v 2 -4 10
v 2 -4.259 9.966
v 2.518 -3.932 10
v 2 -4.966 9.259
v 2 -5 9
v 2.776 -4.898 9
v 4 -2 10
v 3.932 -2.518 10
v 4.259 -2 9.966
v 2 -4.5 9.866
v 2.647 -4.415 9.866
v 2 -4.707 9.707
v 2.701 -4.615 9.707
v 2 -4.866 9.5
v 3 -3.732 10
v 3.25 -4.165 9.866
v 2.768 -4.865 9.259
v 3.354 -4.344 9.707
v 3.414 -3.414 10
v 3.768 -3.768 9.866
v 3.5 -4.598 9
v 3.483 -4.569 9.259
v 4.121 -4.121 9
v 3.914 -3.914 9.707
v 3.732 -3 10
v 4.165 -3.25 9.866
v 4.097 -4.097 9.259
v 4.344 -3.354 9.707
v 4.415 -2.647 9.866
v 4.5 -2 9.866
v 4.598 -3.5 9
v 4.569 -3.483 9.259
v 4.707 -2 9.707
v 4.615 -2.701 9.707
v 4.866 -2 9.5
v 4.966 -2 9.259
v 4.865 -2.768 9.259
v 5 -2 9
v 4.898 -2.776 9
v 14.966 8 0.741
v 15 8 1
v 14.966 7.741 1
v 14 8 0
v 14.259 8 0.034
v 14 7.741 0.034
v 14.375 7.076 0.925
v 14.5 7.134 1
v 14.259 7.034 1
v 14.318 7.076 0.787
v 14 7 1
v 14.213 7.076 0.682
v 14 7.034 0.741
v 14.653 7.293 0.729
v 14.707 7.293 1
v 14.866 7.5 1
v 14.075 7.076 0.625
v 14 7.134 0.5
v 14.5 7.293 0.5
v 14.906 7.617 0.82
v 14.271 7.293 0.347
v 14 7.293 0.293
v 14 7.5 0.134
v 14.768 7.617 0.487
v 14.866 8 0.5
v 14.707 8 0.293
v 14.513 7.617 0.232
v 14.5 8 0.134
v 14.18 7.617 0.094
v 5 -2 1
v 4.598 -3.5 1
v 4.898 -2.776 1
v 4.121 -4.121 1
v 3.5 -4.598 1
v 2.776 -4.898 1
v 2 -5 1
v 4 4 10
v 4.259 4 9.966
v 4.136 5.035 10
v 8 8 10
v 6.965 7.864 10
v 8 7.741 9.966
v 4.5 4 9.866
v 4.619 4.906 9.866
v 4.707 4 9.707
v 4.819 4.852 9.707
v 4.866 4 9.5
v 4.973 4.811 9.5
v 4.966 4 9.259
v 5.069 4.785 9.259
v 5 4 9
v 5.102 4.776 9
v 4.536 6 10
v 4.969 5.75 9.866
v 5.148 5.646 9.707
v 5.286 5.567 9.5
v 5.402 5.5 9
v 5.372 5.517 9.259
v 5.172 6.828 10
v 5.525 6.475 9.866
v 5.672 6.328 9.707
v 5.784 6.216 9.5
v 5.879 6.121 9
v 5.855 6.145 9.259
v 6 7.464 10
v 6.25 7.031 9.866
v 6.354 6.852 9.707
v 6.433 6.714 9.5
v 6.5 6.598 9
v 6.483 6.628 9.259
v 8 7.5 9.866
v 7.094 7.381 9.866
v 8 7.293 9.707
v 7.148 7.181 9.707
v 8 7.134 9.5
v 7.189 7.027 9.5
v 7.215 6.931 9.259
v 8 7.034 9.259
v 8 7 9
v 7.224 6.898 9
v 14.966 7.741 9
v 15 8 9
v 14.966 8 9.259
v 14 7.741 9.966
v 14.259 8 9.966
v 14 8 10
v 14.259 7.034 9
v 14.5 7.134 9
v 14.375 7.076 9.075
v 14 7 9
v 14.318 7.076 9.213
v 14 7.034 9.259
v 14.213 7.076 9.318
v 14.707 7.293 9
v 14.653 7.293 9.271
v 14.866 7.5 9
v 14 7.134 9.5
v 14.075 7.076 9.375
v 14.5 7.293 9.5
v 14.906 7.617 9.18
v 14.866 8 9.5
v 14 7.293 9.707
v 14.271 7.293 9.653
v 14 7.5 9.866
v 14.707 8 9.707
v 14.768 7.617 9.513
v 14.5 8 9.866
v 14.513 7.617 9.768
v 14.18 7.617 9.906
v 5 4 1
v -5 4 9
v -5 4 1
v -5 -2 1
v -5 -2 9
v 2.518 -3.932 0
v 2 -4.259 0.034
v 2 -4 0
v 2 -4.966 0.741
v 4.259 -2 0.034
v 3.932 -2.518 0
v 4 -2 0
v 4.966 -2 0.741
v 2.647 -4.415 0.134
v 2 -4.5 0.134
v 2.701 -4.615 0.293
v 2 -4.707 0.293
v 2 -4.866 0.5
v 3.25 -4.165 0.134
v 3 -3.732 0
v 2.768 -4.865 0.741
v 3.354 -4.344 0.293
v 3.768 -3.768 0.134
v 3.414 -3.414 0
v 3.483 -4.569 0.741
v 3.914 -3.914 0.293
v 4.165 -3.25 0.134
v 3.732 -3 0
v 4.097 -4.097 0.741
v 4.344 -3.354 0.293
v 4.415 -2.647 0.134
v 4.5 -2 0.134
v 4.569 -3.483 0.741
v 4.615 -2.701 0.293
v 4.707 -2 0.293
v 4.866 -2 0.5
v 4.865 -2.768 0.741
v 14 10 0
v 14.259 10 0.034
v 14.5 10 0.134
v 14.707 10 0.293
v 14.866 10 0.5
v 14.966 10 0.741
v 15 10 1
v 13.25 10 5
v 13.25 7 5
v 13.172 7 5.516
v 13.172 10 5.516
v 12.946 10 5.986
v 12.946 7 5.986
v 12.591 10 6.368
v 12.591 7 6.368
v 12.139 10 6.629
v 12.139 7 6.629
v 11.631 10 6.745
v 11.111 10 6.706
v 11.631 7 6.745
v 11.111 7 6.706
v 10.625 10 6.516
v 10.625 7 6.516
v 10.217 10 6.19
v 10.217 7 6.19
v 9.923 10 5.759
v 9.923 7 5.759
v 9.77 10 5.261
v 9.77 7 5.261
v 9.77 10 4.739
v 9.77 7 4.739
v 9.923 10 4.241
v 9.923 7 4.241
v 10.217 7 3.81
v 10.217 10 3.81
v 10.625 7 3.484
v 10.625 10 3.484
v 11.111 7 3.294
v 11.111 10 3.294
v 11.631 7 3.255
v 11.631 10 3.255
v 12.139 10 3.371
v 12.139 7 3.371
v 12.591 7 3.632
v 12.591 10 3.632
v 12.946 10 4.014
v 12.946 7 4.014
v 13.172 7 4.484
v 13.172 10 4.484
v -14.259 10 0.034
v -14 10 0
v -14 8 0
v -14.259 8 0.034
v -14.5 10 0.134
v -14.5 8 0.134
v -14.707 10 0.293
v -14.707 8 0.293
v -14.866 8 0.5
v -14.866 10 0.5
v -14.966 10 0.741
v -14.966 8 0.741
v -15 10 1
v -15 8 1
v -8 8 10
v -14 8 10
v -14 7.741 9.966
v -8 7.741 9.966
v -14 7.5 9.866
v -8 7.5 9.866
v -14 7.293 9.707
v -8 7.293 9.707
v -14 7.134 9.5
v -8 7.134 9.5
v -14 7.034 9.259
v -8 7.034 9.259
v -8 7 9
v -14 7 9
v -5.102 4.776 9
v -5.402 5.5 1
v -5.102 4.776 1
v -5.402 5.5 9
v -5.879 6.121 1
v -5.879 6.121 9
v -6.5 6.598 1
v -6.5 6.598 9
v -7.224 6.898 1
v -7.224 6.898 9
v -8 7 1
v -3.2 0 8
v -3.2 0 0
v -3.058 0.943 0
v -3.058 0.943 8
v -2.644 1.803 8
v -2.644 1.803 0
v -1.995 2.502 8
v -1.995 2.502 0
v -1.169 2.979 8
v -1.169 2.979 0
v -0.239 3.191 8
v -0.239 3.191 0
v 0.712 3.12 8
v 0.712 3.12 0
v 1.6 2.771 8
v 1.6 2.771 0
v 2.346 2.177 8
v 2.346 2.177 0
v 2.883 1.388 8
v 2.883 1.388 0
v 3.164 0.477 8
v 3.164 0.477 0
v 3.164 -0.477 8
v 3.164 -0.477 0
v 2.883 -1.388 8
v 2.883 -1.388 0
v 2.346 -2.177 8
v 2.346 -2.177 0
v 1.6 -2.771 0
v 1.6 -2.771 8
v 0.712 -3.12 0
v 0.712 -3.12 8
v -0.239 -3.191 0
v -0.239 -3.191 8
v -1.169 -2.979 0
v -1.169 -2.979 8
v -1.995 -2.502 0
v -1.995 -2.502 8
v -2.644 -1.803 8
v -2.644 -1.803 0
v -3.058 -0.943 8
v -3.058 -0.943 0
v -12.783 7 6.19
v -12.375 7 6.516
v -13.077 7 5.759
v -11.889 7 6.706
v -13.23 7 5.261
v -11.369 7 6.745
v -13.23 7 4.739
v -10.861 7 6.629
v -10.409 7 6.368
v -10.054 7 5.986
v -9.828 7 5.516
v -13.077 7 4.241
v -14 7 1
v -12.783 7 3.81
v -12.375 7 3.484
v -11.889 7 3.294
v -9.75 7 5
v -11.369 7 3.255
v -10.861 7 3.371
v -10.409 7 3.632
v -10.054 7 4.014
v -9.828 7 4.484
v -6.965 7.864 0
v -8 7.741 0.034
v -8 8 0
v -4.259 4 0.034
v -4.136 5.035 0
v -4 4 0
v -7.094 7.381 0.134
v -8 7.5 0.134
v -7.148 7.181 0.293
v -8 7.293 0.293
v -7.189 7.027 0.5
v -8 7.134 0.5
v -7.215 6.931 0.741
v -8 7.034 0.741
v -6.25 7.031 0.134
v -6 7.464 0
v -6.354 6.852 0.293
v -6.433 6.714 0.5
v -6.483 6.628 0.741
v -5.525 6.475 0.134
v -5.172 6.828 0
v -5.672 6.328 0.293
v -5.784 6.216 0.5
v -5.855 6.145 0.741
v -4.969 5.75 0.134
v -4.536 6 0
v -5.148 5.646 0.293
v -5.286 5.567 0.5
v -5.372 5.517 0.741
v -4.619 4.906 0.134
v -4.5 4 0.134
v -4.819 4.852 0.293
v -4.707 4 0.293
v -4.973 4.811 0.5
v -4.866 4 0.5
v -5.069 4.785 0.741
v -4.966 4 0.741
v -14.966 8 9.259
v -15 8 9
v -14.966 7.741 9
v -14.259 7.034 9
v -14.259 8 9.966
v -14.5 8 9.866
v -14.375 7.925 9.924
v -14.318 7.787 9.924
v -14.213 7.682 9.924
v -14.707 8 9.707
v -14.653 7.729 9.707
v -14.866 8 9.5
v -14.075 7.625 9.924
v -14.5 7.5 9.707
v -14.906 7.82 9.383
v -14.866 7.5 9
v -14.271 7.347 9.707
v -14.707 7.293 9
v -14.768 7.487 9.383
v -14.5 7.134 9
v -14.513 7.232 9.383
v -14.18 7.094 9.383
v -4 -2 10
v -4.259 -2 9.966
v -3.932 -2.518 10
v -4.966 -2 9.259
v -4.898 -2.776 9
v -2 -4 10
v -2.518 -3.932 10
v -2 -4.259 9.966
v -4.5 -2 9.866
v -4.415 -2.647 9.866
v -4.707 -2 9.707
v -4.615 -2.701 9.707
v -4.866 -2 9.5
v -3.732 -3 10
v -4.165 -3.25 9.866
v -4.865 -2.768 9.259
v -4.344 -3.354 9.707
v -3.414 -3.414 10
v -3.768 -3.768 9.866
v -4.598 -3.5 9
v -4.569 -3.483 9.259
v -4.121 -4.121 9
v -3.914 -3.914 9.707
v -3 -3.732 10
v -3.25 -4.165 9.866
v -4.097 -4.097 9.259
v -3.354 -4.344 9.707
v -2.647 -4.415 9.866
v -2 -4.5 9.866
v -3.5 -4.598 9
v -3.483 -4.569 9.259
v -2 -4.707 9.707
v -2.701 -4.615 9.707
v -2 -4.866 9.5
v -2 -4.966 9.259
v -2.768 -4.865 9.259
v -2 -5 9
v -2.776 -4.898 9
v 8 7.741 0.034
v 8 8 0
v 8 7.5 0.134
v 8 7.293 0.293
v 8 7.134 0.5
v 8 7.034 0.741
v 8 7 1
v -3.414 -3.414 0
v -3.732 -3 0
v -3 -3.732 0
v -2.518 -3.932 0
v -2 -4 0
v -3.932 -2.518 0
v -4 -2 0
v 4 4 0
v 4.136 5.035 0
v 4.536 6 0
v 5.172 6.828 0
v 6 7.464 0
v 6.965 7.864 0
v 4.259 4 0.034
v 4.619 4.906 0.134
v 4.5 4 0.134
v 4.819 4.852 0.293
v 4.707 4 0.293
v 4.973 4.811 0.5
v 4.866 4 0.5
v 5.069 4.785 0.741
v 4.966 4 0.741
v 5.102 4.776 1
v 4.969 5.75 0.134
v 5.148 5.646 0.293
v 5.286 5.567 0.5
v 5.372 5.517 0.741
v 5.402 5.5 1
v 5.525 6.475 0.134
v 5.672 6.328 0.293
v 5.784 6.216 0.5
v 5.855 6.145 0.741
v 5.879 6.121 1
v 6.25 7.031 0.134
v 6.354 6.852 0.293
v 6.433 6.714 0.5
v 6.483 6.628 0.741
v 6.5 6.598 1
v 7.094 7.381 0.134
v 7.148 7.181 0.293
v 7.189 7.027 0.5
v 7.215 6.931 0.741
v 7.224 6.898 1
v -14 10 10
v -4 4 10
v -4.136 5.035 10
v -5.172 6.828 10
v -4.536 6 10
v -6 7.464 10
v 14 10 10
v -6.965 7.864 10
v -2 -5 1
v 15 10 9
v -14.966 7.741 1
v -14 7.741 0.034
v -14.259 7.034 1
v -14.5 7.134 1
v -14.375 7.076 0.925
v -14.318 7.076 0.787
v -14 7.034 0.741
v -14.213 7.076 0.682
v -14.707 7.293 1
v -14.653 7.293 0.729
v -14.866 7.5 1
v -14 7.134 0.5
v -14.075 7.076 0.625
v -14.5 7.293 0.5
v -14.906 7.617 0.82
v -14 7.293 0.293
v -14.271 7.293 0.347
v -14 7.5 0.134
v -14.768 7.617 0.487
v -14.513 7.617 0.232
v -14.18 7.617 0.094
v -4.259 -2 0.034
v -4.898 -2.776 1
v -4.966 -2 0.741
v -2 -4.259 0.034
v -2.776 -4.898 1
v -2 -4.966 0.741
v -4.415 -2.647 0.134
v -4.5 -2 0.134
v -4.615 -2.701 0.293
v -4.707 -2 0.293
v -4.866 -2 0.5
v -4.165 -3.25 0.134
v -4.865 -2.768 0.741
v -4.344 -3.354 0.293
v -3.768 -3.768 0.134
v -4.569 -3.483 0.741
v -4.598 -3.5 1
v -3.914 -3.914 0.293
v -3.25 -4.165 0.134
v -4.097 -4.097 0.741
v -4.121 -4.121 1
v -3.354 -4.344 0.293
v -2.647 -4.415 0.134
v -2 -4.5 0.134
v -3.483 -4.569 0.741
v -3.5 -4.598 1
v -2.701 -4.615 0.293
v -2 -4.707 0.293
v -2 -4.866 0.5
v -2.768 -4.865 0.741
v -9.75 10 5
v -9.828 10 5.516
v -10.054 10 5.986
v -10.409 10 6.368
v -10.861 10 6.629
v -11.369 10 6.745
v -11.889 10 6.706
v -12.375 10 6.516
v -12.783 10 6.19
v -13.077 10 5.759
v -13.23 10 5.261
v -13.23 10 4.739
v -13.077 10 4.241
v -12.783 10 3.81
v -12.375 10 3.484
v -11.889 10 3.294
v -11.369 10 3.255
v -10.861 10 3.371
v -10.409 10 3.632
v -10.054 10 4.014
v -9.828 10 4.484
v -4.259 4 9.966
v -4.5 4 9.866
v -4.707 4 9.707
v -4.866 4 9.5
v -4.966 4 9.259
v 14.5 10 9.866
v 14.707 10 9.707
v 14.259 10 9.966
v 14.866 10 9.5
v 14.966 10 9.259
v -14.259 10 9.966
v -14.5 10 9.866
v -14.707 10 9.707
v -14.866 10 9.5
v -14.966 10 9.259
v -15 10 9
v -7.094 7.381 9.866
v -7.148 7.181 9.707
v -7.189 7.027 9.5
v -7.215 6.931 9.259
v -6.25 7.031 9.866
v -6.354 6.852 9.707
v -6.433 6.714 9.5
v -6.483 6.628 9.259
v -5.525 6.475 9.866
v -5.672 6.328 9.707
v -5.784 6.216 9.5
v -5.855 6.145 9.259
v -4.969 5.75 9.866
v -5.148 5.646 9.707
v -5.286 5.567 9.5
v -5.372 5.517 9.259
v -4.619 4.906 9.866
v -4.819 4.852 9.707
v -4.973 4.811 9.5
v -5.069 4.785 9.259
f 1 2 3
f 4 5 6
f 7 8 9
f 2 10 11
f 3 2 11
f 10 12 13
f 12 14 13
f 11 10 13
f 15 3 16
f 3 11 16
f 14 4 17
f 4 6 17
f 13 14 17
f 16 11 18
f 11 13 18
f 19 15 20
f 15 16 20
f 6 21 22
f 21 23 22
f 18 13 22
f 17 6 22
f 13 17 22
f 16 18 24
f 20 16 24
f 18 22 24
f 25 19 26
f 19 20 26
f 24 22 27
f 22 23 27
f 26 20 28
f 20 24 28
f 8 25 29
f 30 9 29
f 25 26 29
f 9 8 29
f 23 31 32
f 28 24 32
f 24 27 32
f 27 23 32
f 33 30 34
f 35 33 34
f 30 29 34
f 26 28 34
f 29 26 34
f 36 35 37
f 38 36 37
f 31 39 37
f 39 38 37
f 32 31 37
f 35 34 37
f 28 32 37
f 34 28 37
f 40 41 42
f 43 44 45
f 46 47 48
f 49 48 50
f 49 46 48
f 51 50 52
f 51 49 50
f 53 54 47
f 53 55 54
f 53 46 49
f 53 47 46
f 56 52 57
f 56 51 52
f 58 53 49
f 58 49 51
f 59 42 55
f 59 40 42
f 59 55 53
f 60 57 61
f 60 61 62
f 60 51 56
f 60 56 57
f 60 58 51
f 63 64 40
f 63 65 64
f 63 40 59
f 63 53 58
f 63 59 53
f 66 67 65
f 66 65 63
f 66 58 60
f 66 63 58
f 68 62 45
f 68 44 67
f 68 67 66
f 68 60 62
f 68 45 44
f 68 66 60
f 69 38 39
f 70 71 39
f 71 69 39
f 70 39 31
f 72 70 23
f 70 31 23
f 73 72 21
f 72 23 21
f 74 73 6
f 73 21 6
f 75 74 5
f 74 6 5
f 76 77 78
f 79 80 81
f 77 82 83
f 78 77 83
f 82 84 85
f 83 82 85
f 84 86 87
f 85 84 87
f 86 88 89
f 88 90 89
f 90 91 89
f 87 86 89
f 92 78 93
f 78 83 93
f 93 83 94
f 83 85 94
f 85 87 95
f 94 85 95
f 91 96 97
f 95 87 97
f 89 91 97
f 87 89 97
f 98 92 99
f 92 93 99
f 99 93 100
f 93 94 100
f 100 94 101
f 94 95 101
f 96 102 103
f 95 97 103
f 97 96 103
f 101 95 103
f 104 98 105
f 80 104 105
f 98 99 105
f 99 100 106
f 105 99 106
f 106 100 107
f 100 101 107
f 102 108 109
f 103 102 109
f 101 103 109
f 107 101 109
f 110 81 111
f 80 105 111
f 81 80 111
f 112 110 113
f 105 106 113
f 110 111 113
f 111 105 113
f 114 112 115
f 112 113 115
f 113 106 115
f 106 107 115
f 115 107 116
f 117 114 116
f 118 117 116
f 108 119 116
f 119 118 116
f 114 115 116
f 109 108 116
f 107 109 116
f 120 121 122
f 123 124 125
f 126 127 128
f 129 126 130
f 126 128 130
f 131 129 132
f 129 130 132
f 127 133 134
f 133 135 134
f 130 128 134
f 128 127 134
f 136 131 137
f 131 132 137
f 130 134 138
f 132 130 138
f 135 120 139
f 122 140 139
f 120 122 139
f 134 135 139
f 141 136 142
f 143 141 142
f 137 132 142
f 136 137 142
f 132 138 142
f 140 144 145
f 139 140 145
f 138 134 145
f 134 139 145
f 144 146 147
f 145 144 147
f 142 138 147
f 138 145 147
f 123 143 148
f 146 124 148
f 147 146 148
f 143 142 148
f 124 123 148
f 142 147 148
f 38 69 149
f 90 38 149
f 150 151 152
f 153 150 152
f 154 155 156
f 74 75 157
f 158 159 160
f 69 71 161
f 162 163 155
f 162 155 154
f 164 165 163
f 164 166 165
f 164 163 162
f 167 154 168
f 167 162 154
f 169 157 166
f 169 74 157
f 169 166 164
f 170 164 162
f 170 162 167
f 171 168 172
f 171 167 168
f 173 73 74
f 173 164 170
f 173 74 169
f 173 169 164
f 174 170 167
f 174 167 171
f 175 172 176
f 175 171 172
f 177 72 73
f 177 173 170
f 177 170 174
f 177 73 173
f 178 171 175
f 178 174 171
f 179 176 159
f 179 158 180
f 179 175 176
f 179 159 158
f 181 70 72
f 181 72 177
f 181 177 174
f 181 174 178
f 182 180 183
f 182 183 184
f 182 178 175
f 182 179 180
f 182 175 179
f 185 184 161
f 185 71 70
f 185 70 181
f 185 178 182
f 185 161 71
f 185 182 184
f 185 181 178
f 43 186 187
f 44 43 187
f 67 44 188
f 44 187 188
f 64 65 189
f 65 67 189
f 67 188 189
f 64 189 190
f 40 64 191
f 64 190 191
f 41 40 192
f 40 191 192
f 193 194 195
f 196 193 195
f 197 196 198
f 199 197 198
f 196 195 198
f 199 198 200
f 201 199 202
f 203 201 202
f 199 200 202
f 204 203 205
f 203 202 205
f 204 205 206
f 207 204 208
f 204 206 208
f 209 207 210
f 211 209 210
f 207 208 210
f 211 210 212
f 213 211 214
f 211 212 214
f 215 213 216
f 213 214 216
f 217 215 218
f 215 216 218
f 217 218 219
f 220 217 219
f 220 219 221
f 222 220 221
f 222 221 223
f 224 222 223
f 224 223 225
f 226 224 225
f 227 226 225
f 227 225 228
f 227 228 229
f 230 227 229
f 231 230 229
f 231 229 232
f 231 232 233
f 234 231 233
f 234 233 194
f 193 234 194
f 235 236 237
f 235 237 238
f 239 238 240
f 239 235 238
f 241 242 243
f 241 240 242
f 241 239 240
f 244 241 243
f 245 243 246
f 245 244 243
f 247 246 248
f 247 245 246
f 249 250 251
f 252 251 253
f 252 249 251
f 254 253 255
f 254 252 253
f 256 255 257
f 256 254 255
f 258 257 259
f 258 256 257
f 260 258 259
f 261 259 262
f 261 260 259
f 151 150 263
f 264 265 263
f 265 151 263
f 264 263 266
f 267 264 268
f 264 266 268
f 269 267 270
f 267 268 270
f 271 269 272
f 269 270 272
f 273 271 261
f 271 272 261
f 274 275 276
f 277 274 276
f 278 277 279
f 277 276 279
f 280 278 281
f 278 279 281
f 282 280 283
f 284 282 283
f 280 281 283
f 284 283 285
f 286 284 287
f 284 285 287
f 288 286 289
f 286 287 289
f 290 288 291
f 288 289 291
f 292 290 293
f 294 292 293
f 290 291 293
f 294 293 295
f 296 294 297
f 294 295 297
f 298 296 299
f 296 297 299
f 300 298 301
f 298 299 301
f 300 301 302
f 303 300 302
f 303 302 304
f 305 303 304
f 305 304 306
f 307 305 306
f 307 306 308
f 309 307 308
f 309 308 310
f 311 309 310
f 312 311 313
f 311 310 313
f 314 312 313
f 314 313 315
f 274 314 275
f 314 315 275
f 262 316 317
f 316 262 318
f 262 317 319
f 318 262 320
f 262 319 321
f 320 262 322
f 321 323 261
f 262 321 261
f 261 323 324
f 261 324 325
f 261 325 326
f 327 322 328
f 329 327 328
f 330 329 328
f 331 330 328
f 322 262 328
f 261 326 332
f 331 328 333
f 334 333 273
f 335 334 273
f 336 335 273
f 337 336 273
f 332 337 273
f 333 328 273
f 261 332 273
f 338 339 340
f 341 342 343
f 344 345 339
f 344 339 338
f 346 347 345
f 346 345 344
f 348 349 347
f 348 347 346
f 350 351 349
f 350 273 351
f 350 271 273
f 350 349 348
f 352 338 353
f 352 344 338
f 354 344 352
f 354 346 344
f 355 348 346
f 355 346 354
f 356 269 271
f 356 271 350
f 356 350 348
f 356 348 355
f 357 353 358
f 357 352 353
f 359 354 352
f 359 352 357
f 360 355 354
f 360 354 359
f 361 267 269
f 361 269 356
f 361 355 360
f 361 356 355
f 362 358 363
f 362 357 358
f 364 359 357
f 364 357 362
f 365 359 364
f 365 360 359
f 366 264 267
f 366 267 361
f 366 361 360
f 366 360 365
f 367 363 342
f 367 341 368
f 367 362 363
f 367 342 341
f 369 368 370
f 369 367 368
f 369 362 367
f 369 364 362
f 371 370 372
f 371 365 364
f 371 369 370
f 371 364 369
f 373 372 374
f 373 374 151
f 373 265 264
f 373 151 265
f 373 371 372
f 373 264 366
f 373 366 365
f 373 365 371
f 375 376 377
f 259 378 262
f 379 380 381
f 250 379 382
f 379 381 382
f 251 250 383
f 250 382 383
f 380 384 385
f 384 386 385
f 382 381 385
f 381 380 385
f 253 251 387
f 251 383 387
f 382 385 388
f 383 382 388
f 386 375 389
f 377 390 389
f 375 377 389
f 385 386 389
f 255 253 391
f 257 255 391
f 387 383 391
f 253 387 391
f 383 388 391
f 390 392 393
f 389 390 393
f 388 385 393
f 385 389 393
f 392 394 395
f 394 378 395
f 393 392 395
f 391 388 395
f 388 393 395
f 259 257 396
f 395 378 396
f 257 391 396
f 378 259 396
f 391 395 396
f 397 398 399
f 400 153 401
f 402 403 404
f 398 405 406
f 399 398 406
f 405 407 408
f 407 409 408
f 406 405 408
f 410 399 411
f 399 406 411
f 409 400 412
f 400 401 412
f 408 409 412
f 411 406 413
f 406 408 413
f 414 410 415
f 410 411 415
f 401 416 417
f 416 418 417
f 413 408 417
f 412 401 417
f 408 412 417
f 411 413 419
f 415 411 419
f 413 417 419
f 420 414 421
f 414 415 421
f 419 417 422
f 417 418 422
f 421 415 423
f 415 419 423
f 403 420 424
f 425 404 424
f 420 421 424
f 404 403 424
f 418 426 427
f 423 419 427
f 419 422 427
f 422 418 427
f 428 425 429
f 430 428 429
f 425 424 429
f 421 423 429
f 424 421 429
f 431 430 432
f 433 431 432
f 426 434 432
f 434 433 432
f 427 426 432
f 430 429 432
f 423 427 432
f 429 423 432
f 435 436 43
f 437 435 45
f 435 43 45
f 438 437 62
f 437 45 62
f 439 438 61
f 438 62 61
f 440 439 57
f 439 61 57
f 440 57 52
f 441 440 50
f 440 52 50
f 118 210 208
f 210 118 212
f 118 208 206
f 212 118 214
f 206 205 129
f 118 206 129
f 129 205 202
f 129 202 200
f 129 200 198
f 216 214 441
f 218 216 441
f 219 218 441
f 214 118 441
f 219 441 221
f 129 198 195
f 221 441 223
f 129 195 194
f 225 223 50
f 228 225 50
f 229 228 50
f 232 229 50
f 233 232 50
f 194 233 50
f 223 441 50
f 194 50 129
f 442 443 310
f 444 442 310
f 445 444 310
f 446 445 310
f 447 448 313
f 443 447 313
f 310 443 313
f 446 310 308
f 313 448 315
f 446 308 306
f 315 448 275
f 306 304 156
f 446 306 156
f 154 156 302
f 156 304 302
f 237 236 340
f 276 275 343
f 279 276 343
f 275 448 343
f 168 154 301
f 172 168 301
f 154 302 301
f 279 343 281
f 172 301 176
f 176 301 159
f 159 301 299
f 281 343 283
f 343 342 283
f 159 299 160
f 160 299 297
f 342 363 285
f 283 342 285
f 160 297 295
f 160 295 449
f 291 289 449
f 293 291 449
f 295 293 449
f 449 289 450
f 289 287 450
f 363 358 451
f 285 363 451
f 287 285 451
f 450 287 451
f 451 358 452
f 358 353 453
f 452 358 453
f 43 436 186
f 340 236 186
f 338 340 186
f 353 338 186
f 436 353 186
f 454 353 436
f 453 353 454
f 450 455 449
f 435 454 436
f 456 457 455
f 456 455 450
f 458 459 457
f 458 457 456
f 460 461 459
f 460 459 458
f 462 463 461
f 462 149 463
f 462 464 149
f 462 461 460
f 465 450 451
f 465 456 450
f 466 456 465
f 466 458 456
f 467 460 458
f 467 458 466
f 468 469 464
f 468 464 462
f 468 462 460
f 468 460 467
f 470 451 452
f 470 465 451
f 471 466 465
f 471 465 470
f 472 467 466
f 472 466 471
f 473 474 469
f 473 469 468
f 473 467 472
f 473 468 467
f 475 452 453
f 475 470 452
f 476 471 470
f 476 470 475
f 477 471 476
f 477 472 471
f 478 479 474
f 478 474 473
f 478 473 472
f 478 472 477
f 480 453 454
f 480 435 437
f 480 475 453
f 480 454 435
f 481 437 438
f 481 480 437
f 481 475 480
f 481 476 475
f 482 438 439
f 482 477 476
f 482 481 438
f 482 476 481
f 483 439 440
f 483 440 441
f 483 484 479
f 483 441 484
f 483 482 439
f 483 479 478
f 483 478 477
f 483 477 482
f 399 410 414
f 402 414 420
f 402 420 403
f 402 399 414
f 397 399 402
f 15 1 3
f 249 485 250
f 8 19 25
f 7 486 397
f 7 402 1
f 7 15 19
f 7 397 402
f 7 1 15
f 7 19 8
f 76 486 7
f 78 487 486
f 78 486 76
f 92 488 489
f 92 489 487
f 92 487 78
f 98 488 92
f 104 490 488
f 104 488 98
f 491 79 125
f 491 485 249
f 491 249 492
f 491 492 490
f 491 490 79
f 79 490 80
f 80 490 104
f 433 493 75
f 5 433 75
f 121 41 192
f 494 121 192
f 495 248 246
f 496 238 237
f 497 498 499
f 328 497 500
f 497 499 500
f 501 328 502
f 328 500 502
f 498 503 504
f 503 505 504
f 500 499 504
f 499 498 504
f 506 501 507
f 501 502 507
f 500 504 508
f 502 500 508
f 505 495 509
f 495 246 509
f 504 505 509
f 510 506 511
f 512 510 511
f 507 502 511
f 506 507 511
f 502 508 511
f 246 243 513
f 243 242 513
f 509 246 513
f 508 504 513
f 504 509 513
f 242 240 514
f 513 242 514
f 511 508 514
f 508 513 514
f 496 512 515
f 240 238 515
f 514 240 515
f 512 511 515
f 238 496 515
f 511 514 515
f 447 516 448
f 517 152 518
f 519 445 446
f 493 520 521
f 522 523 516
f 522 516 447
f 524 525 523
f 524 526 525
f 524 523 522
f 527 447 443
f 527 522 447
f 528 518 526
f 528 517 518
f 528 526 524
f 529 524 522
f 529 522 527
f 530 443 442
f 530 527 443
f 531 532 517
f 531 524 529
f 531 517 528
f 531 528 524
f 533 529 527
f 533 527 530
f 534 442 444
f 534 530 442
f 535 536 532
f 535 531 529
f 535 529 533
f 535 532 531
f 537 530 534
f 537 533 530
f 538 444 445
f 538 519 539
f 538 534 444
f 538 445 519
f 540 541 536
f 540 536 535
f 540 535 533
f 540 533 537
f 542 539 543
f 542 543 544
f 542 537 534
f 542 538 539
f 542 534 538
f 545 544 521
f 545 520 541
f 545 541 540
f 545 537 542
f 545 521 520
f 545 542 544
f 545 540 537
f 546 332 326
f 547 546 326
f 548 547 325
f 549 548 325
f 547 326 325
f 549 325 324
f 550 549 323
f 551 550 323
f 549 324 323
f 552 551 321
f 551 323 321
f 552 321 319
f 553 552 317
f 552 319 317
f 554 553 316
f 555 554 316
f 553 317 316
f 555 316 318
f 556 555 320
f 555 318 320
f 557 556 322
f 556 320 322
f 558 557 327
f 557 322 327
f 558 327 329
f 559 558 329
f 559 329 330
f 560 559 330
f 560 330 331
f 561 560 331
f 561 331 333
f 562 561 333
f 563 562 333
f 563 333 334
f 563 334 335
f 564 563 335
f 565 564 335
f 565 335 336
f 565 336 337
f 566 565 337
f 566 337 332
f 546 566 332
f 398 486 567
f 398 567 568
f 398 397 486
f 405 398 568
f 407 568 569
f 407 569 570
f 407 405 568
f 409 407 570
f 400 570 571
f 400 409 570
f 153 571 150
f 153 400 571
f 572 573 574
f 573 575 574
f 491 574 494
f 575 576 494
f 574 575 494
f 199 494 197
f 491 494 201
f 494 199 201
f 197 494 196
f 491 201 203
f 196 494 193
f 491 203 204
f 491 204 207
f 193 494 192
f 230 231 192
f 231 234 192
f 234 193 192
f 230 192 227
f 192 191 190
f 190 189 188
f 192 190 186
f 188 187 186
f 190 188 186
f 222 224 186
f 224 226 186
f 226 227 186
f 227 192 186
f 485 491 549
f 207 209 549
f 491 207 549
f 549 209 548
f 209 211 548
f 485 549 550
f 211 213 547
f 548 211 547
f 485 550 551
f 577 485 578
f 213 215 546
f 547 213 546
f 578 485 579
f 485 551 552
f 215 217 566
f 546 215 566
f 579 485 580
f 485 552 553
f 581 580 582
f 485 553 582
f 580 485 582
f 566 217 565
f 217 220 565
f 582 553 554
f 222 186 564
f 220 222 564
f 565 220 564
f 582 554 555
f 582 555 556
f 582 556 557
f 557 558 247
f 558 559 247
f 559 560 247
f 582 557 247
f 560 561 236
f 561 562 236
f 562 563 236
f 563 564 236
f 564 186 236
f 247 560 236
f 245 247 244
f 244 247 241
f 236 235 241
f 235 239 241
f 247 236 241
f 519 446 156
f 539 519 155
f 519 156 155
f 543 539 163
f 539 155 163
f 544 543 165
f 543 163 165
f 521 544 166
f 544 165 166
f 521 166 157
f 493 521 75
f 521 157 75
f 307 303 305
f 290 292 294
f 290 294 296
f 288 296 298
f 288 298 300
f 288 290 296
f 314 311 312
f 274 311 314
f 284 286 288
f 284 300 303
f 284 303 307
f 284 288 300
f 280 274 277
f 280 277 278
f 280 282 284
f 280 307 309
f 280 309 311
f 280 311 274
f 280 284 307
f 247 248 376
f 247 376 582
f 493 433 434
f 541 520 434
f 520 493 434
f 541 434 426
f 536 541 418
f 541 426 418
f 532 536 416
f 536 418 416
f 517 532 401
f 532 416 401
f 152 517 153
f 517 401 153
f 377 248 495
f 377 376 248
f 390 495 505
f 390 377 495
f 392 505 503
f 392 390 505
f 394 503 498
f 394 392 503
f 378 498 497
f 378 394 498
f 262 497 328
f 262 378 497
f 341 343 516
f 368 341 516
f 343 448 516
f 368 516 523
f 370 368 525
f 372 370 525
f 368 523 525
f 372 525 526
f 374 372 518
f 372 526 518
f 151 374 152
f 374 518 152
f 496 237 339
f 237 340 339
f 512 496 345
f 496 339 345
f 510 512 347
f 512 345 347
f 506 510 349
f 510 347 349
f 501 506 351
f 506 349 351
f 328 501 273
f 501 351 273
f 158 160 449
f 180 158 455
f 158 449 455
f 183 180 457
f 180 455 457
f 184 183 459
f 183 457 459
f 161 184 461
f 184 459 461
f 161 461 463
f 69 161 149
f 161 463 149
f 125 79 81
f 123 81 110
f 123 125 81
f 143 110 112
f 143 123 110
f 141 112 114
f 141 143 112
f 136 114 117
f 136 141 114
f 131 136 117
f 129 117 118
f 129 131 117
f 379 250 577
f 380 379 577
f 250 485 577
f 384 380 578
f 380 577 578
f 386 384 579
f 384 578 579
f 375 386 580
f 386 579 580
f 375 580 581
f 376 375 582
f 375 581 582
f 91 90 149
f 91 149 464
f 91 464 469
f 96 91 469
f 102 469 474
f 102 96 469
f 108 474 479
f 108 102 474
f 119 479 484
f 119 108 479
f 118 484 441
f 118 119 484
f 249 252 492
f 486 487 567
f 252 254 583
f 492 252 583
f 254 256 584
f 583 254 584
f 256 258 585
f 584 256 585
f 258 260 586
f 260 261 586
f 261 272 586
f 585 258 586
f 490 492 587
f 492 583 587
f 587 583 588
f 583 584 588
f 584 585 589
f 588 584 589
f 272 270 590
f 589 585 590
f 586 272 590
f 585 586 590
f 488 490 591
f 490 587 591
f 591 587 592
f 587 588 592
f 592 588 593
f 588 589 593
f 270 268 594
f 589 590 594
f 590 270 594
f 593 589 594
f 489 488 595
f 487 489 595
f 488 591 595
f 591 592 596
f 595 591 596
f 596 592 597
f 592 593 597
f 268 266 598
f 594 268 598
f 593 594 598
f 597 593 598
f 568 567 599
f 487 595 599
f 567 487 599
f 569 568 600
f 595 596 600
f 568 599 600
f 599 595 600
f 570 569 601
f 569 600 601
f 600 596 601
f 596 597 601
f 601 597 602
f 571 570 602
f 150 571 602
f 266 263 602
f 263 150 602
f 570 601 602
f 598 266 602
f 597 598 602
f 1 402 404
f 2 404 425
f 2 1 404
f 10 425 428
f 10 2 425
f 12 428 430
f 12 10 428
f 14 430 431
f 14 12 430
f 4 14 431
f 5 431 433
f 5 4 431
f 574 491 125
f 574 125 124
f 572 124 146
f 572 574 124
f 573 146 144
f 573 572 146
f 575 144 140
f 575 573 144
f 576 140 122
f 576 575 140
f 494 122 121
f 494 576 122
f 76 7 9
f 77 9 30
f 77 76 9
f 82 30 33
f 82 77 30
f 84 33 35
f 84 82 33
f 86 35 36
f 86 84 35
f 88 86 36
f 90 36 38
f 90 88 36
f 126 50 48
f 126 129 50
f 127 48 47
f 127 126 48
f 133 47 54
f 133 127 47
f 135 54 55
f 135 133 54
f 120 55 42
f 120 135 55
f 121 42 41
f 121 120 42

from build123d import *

# Parameters (mm, degrees)
SKETCH_1_W          = 10
SKETCH_1_H          = 3
EXTRUDE_1_DEPTH     = 10
SKETCH_2_R          = 3.2
CUT_EXTRUDE_1_DEPTH = 8
SKETCH_3_R          = 1.75
CUT_EXTRUDE_2_DEPTH = 4
FILLET_1_R          = 3
FILLET_2_R          = 1


with BuildPart() as part:
    # ｽｹｯﾁ1 → ﾎﾞｽ - 押し出し1 (new body)
    with BuildSketch(Plane.XY):
        Polygon((5, 10), (0, 10), (0, -5), (5, -5), (5, 7), align=None)
        with Locations((10, 8.5)):
            Rectangle(SKETCH_1_W, SKETCH_1_H)
        Polygon((0, -5), (0, 10), (-5, 10), (-5, 7), (-5, -5), align=None)
        with Locations((-10, 8.5)):
            Rectangle(SKETCH_1_W, SKETCH_1_H)
    extrude(amount=EXTRUDE_1_DEPTH)

    # ｽｹｯﾁ2 → ｶｯﾄ - 押し出し1 (cut)
    with BuildSketch(Plane(origin=(0, 0, 0), x_dir=(-1, 0, 0), z_dir=(0, 0, -1))):
        Circle(SKETCH_2_R)
    extrude(amount=-CUT_EXTRUDE_1_DEPTH, mode=Mode.SUBTRACT)

    # ｽｹｯﾁ3 → ｶｯﾄ - 押し出し2 (cut, through all)
    with BuildSketch(Plane.XZ.offset(-7)):
        with Locations((-11.5, 5)):
            Circle(SKETCH_3_R)
        with Locations((11.5, 5)):
            Circle(SKETCH_3_R)
    extrude(amount=-CUT_EXTRUDE_2_DEPTH, mode=Mode.SUBTRACT)

    # ﾌｨﾚｯﾄ1
    fillet_1_edges = [part.edges().sort_by_distance(p)[0] for p in [
        (5, -5, 5),
        (-5, -5, 5),
        (-5, 7, 5),
        (5, 7, 5),
    ]]
    fillet(fillet_1_edges, radius=FILLET_1_R)

    # ﾌｨﾚｯﾄ2
    fillet_2_edges = [part.edges().sort_by_distance(p)[0] for p in [
        (-15, 8.5, 0),
        (15, 8.5, 0),
        (15, 8.5, 10),
        (-15, 7, 5),
        (15, 7, 5),
        (-15, 8.5, 10),
        (-5, 1, 0),
        (-5, 1, 10),
        (-11.5, 7, 0),
        (-11.5, 7, 10),
        (11.5, 7, 0),
        (11.5, 7, 10),
        (5, 1, 0),
        (5, 1, 10),
        (0, -5, 0),
        (0, -5, 10),
        (4.121320344, -4.121320344, 0),
        (-4.121320344, -4.121320344, 0),
        (4.121320344, -4.121320344, 10),
        (-4.121320344, -4.121320344, 10),
        (-5.878679656, 6.121320344, 0),
        (-5.878679656, 6.121320344, 10),
        (5.878679656, 6.121320344, 0),
        (5.878679656, 6.121320344, 10),
    ]]
    fillet(fillet_2_edges, radius=FILLET_2_R)


solid = part.part
